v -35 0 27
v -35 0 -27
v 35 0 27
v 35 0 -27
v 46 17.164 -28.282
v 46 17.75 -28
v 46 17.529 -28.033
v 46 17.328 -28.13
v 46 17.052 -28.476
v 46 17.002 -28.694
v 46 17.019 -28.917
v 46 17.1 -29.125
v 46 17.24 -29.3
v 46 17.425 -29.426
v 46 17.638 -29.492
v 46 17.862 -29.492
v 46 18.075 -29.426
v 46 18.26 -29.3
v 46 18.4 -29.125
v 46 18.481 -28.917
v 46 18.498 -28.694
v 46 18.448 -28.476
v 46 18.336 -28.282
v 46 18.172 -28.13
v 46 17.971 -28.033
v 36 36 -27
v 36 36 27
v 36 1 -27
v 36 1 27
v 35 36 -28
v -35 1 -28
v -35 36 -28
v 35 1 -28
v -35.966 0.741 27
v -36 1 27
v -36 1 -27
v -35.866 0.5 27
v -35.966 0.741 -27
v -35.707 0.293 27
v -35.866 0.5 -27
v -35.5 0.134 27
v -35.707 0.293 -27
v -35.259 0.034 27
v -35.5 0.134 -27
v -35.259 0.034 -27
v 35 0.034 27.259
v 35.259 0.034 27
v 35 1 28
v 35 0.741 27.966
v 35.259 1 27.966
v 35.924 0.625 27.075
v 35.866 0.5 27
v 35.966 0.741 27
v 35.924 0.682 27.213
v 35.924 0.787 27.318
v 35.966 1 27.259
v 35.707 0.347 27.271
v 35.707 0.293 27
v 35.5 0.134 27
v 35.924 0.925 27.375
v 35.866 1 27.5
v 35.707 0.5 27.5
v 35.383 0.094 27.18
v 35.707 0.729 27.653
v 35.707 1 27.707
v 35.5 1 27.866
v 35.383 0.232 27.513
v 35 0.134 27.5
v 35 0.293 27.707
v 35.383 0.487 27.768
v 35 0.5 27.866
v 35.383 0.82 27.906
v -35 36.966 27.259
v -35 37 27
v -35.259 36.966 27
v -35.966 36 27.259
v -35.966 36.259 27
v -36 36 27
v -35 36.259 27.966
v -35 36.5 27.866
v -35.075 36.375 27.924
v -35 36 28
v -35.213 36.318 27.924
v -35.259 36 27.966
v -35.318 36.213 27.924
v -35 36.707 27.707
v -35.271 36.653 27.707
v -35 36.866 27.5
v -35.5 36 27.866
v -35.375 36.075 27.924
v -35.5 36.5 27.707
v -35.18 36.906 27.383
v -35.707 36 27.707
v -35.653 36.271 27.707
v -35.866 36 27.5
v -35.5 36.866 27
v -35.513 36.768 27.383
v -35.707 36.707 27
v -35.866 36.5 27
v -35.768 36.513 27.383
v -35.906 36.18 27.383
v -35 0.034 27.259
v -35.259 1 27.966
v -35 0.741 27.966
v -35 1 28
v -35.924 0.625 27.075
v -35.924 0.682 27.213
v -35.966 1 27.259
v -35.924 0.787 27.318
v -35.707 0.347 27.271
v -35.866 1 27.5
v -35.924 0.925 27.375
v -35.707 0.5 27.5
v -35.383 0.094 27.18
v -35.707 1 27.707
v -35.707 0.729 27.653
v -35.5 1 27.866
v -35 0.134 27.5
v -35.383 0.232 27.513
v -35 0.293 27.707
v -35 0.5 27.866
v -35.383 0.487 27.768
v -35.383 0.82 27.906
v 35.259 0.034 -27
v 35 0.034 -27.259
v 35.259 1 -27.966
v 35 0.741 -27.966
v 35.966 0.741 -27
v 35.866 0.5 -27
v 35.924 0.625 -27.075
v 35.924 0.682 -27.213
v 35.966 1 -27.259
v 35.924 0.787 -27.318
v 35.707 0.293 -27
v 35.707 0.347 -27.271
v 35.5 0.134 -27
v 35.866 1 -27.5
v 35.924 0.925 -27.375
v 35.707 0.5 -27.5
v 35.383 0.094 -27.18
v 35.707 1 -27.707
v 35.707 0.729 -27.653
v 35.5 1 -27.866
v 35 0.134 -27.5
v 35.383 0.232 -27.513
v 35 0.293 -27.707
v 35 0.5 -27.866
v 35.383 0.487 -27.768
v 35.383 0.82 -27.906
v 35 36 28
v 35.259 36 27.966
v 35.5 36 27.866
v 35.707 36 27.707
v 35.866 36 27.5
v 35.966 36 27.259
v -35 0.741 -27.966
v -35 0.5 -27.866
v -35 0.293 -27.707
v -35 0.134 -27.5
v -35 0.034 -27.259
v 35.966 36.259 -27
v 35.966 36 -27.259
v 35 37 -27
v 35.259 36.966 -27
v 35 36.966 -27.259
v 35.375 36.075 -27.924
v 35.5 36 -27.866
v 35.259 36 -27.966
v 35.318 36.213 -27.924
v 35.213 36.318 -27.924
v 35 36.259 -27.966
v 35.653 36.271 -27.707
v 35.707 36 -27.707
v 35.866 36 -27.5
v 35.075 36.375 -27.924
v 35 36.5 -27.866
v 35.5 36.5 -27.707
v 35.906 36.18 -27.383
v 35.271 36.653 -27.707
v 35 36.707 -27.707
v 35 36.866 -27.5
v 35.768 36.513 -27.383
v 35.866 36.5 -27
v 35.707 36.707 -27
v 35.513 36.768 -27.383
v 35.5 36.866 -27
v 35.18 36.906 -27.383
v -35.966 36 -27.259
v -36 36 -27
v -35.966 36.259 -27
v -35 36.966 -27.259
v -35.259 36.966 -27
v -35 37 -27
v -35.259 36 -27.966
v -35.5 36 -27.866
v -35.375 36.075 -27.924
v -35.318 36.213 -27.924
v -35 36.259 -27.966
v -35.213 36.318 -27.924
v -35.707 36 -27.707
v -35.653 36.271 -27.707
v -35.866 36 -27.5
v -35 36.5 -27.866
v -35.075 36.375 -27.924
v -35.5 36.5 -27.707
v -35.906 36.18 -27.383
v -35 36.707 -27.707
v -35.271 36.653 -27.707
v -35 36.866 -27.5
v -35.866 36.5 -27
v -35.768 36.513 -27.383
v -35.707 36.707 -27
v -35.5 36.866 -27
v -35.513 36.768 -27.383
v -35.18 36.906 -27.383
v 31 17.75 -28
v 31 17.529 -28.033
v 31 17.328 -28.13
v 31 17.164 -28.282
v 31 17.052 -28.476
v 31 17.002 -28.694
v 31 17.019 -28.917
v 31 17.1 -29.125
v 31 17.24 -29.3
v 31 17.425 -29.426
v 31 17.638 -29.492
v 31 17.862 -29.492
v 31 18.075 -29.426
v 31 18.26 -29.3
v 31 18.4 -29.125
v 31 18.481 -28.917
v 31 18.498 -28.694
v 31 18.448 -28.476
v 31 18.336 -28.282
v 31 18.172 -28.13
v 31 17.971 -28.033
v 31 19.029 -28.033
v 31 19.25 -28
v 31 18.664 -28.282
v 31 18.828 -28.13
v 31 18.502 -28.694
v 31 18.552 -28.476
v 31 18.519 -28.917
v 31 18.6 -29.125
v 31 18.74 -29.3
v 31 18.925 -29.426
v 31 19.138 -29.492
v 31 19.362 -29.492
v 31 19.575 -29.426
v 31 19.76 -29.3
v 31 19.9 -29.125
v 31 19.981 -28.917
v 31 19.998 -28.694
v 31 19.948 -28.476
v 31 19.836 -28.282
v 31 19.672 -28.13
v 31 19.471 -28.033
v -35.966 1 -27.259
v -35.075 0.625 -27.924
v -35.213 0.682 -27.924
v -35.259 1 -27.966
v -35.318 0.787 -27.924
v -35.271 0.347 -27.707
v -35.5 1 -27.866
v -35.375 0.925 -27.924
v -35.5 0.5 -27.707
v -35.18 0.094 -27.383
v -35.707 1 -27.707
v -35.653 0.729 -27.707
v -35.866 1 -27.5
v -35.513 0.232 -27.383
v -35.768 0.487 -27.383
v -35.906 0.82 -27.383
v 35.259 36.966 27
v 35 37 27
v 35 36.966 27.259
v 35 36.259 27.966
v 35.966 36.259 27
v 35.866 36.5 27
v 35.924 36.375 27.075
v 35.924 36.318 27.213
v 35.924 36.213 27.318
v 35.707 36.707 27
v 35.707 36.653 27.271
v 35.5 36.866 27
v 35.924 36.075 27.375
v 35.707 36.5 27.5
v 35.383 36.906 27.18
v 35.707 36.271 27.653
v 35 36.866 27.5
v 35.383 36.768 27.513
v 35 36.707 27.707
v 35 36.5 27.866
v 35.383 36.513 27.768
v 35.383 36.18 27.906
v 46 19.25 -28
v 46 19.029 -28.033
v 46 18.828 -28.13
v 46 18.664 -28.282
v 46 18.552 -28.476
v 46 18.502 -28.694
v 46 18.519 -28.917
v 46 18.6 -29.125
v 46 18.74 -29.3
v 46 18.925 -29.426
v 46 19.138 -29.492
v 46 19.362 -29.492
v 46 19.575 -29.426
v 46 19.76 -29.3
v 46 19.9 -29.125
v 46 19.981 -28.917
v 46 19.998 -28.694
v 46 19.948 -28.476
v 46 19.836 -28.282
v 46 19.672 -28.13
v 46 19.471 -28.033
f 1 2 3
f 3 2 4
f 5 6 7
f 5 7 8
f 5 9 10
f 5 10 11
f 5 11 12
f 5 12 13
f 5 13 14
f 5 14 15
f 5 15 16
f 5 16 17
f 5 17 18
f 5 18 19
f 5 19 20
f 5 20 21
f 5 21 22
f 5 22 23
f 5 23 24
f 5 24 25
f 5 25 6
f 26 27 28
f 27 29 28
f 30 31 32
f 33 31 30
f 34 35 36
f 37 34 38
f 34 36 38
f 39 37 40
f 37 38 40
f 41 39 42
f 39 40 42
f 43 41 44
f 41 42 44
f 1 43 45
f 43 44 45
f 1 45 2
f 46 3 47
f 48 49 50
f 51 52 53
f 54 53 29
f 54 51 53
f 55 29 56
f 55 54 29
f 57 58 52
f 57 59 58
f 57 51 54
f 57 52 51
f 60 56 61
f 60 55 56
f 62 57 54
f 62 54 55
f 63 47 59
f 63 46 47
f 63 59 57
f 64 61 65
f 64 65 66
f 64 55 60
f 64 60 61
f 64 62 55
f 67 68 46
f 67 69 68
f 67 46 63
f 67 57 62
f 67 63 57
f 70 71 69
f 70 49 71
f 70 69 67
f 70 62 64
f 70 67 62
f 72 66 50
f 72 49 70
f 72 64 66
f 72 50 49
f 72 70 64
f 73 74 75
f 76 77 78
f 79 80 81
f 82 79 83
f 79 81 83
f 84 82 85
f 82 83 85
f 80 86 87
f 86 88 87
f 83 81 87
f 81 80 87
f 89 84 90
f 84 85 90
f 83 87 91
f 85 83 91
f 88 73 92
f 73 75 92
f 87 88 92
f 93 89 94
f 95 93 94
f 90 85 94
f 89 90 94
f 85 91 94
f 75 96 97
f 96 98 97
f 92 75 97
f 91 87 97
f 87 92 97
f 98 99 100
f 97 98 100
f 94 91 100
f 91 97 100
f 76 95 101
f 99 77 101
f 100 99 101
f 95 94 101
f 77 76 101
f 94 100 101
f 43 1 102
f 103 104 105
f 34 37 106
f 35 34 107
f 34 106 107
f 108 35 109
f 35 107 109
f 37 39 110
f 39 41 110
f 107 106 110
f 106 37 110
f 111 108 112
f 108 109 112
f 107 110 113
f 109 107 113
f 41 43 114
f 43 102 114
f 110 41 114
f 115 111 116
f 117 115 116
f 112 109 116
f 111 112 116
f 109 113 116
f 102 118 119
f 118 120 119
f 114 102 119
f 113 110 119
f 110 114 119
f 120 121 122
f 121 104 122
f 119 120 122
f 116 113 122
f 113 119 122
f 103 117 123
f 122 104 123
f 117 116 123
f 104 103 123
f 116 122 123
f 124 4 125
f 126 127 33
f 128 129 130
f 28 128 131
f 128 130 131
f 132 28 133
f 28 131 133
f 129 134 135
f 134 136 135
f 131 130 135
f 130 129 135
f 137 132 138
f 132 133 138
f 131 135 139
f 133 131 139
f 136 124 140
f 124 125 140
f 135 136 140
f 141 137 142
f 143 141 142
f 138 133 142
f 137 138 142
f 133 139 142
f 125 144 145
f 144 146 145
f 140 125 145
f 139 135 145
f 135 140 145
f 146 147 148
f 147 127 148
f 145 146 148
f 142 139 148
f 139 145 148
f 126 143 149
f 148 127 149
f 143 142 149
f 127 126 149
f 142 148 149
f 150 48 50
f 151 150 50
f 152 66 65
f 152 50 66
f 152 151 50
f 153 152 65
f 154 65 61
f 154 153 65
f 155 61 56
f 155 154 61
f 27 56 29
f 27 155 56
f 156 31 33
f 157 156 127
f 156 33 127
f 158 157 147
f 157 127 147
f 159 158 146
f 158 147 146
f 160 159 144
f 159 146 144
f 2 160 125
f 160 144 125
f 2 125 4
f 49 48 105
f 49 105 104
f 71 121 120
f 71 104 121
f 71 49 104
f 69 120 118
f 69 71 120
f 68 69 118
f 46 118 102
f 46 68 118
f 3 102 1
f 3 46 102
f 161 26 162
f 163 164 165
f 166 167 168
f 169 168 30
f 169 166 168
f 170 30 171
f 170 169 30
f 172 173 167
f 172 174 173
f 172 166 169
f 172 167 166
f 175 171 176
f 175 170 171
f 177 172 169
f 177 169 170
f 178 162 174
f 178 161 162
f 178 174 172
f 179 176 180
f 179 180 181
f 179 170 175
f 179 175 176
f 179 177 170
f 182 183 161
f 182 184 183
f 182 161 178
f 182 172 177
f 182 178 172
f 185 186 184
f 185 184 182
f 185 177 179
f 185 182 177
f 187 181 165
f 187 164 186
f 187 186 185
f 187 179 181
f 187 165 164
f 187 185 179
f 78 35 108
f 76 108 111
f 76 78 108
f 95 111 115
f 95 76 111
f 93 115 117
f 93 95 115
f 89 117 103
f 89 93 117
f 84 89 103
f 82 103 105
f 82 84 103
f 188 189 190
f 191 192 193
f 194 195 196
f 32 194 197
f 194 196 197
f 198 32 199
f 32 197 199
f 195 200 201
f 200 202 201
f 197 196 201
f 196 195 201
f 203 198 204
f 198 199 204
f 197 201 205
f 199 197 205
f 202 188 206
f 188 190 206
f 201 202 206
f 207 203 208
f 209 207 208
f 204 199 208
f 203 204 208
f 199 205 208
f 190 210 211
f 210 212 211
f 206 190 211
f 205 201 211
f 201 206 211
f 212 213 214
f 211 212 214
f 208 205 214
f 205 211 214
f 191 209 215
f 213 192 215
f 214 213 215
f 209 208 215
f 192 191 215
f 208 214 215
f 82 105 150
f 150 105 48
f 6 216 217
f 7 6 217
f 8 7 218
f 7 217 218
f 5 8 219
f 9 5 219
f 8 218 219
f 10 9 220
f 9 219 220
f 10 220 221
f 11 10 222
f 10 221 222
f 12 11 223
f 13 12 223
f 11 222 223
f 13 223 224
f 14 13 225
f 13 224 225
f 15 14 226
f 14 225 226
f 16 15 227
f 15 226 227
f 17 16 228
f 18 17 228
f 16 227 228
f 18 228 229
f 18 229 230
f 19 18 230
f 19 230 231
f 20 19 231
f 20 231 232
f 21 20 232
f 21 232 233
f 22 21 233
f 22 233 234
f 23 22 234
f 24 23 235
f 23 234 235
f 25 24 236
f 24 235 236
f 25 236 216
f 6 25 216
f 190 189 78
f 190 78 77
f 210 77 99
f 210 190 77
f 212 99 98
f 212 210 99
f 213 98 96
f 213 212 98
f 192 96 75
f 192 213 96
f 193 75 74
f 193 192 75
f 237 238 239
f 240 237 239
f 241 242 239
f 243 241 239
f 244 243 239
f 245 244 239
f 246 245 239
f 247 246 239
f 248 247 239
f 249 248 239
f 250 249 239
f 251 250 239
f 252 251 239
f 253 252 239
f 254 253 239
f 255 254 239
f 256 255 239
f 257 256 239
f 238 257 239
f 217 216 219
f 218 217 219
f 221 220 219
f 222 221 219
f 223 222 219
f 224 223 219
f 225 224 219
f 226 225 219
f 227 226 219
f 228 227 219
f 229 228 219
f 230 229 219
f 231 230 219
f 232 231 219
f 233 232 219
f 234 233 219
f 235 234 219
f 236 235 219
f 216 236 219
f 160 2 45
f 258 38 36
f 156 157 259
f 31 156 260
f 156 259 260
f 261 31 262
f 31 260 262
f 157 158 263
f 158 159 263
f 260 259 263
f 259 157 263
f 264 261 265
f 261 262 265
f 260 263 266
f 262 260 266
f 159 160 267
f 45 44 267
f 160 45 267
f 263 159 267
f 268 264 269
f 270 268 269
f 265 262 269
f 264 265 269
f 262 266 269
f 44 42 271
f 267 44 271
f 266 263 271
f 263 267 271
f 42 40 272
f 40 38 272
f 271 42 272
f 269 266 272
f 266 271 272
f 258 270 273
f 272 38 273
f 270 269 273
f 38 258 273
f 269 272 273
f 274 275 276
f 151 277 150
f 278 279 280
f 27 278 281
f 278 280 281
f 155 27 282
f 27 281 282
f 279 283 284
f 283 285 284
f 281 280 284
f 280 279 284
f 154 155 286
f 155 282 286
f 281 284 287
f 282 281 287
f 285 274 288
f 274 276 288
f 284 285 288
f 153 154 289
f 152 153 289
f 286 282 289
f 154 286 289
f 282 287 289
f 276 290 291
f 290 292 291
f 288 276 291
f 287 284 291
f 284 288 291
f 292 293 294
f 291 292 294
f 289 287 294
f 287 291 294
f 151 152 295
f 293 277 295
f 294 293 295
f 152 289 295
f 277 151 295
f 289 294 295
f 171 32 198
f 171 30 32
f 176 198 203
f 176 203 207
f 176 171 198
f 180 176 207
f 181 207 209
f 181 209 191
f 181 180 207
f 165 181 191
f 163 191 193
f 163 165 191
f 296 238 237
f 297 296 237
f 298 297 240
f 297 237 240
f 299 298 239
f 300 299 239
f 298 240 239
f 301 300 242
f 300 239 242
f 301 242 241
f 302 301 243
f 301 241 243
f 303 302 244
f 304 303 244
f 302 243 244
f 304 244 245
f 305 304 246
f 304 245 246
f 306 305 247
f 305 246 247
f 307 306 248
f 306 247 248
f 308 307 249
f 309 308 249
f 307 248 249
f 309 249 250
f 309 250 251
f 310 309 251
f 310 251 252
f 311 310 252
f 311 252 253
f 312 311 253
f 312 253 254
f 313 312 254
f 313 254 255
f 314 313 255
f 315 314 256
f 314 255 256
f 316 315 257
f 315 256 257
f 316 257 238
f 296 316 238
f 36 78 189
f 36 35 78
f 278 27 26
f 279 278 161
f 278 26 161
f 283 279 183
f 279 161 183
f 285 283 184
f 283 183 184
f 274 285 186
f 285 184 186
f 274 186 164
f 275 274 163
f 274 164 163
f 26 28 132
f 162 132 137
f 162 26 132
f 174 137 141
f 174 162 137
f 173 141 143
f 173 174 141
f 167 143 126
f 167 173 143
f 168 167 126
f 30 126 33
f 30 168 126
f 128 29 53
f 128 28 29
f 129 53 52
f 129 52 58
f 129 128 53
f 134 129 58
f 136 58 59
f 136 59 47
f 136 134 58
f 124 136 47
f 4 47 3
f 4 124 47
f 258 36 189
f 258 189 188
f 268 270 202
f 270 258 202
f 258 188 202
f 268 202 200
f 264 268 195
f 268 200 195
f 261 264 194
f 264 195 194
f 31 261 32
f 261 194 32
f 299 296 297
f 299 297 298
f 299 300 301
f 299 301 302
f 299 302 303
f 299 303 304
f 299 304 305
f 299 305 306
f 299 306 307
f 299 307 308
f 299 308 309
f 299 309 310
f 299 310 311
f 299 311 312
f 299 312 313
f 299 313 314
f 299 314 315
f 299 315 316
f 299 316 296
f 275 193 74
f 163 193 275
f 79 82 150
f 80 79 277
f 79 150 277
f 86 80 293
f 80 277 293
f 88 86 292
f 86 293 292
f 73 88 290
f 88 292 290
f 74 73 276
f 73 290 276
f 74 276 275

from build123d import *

# Parameters (mm, degrees)
SKETCH1_W                  = 72
SKETCH1_H                  = 56
BOSS_EXTRUDE1_DEPTH        = 37
BOSS_EXTRUDE2_DEPTH        = 10
BOSS_EXTRUDE2_DEPTH_BACK   = 5
BOSS_EXTRUDE2_START        = 36
SKETCH2_R                  = 0.75
BOSS_EXTRUDE2_2_DEPTH      = 10
BOSS_EXTRUDE2_2_DEPTH_BACK = 5
BOSS_EXTRUDE2_2_START      = 36
FILLET1_R                  = 1


with BuildPart() as part:
    # Sketch1 → Boss-Extrude1 (new body)
    with BuildSketch(Plane(origin=(0, 0, 0), x_dir=(1, 0, 0), z_dir=(0, 1, 0))):
        Rectangle(SKETCH1_W, SKETCH1_H)
    extrude(amount=BOSS_EXTRUDE1_DEPTH)

    # Fillet1
    fillet1_edges = [part.edges().sort_by_distance(p)[0] for p in [
        (-36, 37, 0),
        (0, 37, 28),
        (36, 37, 0),
        (0, 0, 28),
        (-36, 0, 0),
        (0, 0, -28),
        (36, 0, 0),
        (36, 18.5, 28),
        (-36, 18.5, 28),
        (-36, 18.5, -28),
        (36, 18.5, -28),
        (0, 37, -28),
    ]]
    fillet(fillet1_edges, radius=FILLET1_R)


with BuildPart() as body_2:
    # Sketch2 → Boss-Extrude2 (new, two sides: drawn at the far end of the back side and taken through both)
    with BuildSketch(Plane(origin=(0, 0, 0), x_dir=(0, 0, -1), z_dir=(1, 0, 0)).offset(BOSS_EXTRUDE2_START - BOSS_EXTRUDE2_DEPTH_BACK)):
        with Locations(Location((28.75, 19.25, 0), (0, 0, 180))):
            Circle(SKETCH2_R)
    extrude(amount=BOSS_EXTRUDE2_DEPTH + BOSS_EXTRUDE2_DEPTH_BACK)


with BuildPart() as body_3:
    # Sketch2 → Boss-Extrude2 2 (new, two sides: drawn at the far end of the back side and taken through both)
    with BuildSketch(Plane(origin=(0, 0, 0), x_dir=(0, 0, -1), z_dir=(1, 0, 0)).offset(BOSS_EXTRUDE2_2_START - BOSS_EXTRUDE2_2_DEPTH_BACK)):
        with Locations(Location((28.75, 17.75, 0), (0, 0, 180))):
            Circle(SKETCH2_R)
    extrude(amount=BOSS_EXTRUDE2_2_DEPTH + BOSS_EXTRUDE2_2_DEPTH_BACK)


solid = Compound([part.part, body_2.part, body_3.part])
